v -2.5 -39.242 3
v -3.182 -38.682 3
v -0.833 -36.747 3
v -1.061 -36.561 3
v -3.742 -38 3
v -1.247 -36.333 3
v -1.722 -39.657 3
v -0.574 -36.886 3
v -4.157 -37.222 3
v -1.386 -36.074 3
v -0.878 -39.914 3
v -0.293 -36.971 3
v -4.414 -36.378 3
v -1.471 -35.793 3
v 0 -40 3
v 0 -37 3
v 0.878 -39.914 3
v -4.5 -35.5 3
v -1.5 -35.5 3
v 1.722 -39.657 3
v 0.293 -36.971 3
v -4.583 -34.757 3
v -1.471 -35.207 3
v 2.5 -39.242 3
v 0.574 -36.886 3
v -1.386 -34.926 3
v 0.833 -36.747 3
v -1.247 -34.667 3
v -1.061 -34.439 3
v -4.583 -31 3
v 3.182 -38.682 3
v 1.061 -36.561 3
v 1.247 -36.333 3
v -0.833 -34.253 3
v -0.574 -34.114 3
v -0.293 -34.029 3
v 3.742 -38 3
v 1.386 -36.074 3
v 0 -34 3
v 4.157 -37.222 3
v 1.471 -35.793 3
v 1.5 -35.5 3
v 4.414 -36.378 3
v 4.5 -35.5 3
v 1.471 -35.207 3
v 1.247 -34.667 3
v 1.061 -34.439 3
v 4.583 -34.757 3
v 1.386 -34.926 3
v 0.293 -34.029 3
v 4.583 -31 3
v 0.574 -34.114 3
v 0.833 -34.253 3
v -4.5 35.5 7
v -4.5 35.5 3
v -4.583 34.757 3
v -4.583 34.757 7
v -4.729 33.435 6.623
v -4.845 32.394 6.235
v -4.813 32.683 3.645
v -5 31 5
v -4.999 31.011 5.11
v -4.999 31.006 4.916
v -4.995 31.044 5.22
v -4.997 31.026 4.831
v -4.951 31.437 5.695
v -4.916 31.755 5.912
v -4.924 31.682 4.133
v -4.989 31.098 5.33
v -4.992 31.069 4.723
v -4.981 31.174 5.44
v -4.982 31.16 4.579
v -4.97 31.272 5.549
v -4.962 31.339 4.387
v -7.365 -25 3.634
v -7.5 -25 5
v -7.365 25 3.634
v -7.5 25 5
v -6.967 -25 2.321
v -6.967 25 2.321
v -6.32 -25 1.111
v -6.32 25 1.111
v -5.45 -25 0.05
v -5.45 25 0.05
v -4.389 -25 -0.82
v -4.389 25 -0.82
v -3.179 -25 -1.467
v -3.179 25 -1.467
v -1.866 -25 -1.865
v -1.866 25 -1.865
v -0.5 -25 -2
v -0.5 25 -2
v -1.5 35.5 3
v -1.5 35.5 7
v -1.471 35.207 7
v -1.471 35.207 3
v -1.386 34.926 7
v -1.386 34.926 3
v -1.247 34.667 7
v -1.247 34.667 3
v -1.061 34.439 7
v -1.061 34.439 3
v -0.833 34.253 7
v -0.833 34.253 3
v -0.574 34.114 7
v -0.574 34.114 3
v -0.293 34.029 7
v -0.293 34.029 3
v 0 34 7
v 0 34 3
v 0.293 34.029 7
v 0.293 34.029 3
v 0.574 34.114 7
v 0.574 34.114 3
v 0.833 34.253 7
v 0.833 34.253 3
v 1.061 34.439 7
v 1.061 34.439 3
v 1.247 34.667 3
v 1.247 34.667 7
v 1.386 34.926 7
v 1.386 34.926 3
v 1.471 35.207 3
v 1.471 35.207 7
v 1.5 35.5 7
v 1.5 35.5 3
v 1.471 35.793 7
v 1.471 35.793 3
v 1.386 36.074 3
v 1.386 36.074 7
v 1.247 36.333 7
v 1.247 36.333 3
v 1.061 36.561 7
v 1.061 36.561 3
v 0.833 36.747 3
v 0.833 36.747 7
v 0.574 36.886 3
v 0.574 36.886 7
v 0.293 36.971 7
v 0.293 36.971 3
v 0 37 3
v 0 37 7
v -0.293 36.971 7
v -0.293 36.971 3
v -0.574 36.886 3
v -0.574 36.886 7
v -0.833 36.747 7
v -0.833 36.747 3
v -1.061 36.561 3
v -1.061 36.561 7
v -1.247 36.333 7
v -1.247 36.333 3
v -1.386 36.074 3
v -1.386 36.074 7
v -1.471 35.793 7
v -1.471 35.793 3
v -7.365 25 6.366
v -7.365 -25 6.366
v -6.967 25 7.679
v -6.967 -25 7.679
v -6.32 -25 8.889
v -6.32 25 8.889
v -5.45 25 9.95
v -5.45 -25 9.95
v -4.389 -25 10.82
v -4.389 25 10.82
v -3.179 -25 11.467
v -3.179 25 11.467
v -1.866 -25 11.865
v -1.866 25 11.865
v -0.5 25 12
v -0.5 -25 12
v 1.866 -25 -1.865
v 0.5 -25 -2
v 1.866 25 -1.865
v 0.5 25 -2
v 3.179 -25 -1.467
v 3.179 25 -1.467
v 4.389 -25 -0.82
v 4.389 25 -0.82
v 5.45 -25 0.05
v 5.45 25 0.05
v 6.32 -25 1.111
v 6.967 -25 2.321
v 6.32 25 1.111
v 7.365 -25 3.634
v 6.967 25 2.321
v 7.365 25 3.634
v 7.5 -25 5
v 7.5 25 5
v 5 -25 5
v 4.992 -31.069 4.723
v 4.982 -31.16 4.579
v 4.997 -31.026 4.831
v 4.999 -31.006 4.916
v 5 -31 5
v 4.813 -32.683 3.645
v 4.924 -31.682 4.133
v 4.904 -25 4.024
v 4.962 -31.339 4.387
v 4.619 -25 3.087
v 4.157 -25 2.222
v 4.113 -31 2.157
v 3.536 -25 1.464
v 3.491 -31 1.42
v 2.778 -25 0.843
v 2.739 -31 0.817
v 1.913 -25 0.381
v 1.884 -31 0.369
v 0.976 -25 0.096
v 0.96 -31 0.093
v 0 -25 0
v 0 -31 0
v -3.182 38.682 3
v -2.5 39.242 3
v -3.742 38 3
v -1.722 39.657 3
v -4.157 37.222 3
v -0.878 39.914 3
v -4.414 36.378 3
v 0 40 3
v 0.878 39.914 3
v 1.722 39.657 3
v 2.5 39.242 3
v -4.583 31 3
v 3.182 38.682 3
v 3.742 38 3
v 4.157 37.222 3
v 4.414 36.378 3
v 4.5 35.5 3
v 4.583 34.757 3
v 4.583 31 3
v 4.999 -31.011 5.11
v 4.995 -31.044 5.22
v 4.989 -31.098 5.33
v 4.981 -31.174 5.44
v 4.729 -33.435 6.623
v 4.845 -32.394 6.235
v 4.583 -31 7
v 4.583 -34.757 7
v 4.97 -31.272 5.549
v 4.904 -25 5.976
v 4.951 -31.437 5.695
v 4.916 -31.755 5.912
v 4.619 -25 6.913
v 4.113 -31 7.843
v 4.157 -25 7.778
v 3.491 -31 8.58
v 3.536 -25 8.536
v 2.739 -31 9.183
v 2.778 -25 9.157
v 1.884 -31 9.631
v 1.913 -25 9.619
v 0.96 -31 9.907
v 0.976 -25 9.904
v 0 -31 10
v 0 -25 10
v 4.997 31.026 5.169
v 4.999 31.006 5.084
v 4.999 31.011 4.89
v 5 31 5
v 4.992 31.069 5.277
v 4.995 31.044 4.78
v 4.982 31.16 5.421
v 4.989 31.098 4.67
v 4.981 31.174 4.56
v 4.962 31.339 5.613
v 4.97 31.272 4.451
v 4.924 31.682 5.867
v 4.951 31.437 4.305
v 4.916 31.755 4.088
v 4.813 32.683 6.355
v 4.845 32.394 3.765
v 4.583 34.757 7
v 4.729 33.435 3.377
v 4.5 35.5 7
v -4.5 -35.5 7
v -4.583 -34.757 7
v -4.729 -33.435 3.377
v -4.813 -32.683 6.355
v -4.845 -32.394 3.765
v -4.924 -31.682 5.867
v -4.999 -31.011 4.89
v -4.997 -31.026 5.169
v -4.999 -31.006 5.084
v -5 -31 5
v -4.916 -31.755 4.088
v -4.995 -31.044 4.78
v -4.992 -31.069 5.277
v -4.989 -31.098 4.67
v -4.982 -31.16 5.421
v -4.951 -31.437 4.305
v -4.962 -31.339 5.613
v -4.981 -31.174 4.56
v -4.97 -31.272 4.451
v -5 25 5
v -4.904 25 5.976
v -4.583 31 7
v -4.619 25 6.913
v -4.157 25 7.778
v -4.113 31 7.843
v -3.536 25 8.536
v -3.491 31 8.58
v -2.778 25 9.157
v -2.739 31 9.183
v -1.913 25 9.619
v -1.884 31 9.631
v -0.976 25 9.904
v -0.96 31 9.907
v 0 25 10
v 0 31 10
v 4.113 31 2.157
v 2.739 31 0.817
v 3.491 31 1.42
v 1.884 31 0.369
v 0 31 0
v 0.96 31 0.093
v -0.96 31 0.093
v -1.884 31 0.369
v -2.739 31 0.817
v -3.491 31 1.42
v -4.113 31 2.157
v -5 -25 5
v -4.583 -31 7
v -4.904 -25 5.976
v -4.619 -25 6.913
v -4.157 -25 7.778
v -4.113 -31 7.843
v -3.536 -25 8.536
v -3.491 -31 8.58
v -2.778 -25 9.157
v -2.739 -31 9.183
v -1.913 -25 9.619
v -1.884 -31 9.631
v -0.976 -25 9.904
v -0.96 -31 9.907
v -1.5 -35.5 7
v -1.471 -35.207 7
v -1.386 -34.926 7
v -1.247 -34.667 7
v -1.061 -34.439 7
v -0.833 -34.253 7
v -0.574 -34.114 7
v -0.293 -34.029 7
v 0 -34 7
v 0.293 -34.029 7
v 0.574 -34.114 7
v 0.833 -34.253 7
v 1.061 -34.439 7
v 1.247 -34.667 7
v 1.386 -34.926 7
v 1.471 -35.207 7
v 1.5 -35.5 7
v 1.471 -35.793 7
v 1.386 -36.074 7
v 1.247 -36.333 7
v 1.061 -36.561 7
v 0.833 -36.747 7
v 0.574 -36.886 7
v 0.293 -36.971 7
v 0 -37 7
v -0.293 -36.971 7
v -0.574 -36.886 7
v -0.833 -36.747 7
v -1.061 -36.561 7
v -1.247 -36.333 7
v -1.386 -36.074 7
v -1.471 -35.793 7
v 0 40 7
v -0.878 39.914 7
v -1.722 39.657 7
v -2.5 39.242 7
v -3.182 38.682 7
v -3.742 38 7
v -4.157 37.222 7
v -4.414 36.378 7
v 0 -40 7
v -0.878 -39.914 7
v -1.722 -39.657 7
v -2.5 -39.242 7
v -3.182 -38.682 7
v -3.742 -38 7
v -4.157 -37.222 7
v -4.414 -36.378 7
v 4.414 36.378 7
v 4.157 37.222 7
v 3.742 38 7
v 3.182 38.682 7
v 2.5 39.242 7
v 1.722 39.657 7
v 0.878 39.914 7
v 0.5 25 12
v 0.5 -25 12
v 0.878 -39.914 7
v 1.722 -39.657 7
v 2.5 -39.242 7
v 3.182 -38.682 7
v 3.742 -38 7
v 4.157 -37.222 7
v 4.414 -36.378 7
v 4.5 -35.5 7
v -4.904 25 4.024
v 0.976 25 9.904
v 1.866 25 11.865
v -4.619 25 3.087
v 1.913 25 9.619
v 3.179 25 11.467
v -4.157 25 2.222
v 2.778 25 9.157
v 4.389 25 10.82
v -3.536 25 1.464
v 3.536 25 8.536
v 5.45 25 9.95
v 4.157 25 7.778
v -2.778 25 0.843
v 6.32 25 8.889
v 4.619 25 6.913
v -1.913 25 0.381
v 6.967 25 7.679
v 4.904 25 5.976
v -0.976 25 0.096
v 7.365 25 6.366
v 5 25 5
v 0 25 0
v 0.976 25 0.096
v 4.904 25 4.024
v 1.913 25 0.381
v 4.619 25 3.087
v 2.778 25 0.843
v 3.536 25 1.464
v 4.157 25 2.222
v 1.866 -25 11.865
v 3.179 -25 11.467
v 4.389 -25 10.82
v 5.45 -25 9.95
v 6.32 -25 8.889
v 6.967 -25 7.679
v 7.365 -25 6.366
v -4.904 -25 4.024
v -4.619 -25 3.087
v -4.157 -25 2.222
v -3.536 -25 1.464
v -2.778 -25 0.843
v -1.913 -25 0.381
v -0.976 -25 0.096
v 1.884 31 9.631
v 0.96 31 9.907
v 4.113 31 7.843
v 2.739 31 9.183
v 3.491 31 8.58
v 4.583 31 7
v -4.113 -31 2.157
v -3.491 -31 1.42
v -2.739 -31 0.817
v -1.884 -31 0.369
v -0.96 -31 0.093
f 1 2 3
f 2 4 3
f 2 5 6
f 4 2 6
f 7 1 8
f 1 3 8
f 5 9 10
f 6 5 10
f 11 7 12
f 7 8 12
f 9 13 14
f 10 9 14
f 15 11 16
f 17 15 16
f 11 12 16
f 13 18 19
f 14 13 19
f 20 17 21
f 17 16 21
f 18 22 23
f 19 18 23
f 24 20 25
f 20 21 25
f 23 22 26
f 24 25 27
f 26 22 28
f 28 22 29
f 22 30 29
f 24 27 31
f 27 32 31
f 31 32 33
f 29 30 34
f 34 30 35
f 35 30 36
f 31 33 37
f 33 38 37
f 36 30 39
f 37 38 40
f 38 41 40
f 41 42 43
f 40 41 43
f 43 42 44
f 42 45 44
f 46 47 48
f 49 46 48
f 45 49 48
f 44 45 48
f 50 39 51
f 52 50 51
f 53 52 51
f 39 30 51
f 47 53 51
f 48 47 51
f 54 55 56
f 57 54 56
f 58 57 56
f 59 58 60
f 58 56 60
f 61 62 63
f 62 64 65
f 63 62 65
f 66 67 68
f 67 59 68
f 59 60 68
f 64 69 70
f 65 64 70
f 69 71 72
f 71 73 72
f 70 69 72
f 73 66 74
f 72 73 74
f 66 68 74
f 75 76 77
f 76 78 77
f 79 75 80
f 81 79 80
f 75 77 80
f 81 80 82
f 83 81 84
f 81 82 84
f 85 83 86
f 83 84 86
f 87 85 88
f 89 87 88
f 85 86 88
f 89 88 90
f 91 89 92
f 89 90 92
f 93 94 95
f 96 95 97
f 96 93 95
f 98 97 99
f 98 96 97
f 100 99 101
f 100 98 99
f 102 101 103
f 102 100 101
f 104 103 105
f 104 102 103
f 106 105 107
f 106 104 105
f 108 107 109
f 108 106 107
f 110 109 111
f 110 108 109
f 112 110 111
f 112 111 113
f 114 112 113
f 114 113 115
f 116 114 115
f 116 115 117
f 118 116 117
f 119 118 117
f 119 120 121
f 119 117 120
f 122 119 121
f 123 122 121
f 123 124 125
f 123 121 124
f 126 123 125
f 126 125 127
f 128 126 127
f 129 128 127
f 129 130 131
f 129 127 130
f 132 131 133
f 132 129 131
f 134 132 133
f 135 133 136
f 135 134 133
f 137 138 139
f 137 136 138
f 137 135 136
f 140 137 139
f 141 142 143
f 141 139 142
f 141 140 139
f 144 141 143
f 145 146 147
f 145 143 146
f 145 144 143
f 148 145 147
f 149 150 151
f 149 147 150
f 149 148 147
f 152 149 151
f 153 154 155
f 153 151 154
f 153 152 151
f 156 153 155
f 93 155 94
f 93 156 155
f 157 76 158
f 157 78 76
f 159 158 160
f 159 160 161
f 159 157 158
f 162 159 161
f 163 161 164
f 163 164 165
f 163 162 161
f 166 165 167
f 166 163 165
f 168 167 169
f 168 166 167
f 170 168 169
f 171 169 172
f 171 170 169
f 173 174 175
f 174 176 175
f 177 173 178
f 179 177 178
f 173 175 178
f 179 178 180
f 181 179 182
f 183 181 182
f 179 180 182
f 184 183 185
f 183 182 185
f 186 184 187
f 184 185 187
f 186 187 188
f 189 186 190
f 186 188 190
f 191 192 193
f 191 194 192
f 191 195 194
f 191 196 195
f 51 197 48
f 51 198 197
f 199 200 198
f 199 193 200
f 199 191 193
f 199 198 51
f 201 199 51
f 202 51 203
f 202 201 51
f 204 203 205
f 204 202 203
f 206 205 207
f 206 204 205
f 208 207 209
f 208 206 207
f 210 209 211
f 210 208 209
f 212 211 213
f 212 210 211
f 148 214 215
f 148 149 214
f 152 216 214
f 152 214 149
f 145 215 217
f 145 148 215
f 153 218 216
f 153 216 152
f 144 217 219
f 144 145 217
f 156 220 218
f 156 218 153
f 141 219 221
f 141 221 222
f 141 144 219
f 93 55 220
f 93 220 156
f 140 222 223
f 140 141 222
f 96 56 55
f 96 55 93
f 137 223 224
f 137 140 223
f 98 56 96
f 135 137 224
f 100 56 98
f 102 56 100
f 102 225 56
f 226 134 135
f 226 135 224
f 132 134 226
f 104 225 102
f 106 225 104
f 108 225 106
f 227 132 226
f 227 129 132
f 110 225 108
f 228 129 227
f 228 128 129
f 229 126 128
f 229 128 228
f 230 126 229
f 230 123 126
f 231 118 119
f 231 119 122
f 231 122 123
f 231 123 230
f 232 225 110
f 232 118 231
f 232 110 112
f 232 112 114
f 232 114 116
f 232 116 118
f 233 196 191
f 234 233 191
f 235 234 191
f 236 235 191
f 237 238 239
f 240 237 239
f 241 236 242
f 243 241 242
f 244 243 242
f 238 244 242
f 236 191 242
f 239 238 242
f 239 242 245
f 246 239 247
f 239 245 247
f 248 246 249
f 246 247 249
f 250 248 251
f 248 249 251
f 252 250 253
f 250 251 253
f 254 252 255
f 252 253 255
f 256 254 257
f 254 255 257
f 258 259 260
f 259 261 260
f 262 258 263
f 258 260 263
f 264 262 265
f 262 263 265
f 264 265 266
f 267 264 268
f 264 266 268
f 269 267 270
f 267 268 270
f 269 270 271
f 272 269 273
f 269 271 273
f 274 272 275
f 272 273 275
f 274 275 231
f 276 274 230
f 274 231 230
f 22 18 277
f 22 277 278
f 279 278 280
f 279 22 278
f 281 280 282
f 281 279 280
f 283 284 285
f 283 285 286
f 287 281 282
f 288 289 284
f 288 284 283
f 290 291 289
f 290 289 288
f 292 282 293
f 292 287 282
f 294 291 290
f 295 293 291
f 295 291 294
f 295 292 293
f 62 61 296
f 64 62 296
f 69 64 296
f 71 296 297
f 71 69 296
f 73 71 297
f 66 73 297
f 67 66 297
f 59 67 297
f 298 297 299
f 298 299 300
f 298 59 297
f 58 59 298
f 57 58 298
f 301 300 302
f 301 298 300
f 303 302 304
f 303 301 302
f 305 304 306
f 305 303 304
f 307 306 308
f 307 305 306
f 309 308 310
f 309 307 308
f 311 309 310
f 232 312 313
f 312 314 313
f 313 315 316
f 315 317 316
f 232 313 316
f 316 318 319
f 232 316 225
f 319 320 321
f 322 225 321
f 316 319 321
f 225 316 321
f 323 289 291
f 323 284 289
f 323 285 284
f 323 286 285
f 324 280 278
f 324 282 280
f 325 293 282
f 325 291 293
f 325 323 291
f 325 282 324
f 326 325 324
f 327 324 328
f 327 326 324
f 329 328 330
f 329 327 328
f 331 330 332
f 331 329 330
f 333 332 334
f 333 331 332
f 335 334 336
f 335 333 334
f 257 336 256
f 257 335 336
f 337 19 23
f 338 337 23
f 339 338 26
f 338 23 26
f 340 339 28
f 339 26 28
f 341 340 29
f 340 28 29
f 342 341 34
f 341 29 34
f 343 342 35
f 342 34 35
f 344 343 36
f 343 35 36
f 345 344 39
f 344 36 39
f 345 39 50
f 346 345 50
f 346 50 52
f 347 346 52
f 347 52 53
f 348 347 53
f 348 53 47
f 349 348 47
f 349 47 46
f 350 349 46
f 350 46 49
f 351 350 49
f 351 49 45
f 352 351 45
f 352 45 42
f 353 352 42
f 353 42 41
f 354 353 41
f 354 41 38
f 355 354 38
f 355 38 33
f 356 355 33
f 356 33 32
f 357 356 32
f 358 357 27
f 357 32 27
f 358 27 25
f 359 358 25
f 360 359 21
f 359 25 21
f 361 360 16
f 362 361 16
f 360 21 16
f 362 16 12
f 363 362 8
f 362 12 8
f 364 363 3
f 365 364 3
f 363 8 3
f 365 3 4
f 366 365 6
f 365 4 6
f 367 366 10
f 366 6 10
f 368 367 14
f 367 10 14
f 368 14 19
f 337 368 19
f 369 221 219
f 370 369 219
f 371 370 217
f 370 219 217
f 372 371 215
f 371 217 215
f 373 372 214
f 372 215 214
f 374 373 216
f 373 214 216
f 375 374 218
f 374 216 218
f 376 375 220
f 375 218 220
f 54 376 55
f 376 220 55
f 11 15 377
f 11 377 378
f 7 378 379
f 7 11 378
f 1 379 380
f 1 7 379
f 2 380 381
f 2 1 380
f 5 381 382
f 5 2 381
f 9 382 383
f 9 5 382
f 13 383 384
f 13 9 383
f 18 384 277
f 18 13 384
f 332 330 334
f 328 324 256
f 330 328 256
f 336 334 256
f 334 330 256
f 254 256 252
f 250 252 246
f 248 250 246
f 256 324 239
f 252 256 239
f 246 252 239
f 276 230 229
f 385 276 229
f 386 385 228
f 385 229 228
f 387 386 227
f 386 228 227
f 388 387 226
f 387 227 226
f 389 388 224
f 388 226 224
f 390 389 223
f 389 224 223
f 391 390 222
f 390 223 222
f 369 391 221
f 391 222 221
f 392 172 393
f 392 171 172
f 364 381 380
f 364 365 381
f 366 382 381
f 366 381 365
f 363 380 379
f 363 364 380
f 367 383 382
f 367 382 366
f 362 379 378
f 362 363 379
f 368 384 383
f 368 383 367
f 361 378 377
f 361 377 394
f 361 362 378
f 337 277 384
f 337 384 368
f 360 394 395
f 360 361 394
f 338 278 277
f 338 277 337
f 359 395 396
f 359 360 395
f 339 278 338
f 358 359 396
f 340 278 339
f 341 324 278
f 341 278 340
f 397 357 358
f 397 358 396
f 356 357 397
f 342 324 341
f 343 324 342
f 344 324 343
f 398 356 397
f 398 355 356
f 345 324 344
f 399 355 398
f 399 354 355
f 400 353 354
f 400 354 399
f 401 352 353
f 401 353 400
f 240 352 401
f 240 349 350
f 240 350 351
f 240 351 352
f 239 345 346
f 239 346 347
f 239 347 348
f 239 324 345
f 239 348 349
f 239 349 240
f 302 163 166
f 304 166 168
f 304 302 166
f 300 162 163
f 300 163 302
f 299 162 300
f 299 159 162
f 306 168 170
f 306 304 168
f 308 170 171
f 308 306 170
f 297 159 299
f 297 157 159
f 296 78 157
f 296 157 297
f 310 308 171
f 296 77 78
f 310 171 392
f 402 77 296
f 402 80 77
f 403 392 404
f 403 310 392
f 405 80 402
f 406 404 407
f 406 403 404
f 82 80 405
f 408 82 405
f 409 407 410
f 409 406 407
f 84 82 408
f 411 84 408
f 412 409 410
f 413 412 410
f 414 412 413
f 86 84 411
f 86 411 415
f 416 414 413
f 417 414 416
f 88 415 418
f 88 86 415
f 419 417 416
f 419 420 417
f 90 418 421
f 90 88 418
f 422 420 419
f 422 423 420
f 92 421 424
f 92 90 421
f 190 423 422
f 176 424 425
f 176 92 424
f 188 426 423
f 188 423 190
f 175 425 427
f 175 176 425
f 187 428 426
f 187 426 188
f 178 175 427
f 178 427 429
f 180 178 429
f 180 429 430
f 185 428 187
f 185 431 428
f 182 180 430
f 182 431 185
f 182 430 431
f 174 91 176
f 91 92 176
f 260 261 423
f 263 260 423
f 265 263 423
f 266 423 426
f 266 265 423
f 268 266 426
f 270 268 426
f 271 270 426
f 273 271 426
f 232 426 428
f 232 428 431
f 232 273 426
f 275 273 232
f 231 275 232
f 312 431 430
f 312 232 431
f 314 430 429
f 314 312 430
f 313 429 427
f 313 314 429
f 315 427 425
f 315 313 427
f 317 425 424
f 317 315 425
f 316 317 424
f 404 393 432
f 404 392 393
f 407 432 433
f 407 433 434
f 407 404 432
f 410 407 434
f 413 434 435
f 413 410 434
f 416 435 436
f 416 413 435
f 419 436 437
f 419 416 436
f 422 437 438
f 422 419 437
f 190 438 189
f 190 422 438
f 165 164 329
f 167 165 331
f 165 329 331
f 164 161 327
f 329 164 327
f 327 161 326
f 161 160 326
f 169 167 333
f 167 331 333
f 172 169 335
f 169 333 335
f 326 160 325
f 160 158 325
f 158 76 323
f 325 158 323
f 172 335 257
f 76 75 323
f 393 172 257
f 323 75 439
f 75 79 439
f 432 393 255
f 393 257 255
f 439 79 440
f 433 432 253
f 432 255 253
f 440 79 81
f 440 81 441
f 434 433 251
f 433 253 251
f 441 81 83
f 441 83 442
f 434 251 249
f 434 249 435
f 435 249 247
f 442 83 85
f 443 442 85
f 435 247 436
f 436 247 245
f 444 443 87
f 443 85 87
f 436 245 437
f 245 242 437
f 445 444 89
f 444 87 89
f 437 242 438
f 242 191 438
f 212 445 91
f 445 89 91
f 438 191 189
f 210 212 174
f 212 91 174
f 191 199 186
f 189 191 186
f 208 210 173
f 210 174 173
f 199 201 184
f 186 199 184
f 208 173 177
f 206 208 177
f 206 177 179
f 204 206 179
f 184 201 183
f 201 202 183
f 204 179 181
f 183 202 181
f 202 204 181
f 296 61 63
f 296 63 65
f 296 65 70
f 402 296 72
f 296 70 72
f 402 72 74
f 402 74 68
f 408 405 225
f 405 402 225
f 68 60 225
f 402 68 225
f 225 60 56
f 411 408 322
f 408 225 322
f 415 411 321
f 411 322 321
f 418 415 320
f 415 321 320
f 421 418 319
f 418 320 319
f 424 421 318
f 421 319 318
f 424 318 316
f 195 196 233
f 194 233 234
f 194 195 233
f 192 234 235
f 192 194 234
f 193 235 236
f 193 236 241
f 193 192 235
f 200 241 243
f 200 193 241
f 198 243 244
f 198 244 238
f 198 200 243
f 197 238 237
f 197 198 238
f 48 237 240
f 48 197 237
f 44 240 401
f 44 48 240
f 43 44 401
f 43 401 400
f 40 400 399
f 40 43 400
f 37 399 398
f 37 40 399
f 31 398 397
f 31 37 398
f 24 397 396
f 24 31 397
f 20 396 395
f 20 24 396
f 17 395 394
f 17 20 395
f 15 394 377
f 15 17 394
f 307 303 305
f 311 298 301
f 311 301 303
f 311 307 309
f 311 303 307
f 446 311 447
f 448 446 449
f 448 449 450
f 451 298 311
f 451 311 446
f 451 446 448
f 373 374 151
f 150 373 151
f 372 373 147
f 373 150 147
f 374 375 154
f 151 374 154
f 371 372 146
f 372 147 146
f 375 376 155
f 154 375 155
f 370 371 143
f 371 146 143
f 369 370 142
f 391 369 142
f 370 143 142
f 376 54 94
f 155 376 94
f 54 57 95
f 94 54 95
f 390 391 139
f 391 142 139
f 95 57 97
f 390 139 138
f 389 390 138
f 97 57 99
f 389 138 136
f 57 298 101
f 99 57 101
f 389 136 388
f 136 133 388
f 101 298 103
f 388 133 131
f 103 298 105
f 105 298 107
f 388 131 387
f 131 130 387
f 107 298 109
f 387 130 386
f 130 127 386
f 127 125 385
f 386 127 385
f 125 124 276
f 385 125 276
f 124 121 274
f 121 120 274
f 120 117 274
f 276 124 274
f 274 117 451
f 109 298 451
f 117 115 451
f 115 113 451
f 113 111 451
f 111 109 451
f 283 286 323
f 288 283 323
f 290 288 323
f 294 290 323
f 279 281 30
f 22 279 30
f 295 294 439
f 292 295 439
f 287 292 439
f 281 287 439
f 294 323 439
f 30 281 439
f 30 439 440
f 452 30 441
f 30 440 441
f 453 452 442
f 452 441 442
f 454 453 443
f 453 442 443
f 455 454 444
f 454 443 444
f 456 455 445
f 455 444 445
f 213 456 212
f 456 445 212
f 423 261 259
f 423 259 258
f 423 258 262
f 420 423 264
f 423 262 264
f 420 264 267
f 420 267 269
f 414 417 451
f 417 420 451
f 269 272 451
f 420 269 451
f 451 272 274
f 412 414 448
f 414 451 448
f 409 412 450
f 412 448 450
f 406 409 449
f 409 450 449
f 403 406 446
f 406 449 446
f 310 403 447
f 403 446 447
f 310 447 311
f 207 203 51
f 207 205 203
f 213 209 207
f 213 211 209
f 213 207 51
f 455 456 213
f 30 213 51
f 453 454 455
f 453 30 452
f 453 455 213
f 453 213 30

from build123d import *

# Parameters (mm, degrees)
SKETCH2_W                = 10
SKETCH2_H                = 80
BOSS_EXTRUDE1_DEPTH      = 10
FILLET1_R                = 5
CUT_EXTRUDE1_DEPTH       = 3
CUT_EXTRUDE2_START       = 7
SKETCH3_2_W              = 10
SKETCH3_2_H              = 9
CUT_EXTRUDE2_DEPTH       = 3
CUT_EXTRUDE4_START       = -4
CUT_EXTRUDE4_DEPTH       = 46.533119315
SKETCH7_R                = 1.5
CUT_EXTRUDE5_DEPTH       = 41.914545091
BOSS_EXTRUDE2_DEPTH      = 7
BOSS_EXTRUDE2_DEPTH_BACK = 7
SKETCH9_W                = 15
SKETCH9_H                = 50
FILLET3_R                = 7


with BuildPart() as part:
    # Sketch2 → Boss-Extrude1 (new body)
    with BuildSketch(Plane.XY):
        Rectangle(SKETCH2_W, SKETCH2_H)
    extrude(amount=BOSS_EXTRUDE1_DEPTH)

    # Fillet1
    fillet1_edges = [part.edges().sort_by_distance(p)[0] for p in [
        (-5, 0, 0),
        (5, 0, 0),
        (5, 0, 10),
        (-5, 0, 10),
    ]]
    fillet(fillet1_edges, radius=FILLET1_R - 0.0001)  # a hair under: the kernel refuses the full size

    # Sketch3 → Cut-Extrude1 (cut)
    with BuildSketch(Plane.XY):
        with BuildLine():
            Line((-5, -31), (-4.5, -35.5))
            ThreePointArc((-4.5, -35.5), (0, -40), (4.5, -35.5))
            Line((4.5, -35.5), (5, -31))
            Line((5, -31), (-5, -31))
        make_face()
        with BuildLine():
            Line((0, -40), (5, -40))
            Line((5, -40), (5, -31))
            Line((5, -31), (4.5, -35.5))
            ThreePointArc((4.5, -35.5), (3.181980515, -38.681980515), (0, -40))
        make_face()
        with BuildLine():
            Line((-5, -40), (0, -40))
            ThreePointArc((0, -40), (-3.181980515, -38.681980515), (-4.5, -35.5))
            Line((-4.5, -35.5), (-5, -31))
            Line((-5, -31), (-5, -40))
        make_face()
    cut_extrude1 = extrude(amount=CUT_EXTRUDE1_DEPTH, mode=Mode.SUBTRACT)

    # Sketch3<2> → Cut-Extrude2 (cut)
    with BuildSketch(Plane.XY.offset(CUT_EXTRUDE2_START)):
        with Locations((0, -35.5)):
            Rectangle(SKETCH3_2_W, SKETCH3_2_H)
    cut_extrude2 = extrude(amount=CUT_EXTRUDE2_DEPTH, mode=Mode.SUBTRACT)

    # Mirror1: Cut-Extrude1, Cut-Extrude2 across plane
    add(cut_extrude1.mirror(Plane.ZX), mode=Mode.SUBTRACT)
    add(cut_extrude2.mirror(Plane.ZX), mode=Mode.SUBTRACT)

    # Sketch3<4> → Cut-Extrude4 (cut)
    with BuildSketch(Plane.XY.offset(CUT_EXTRUDE4_START)):
        with BuildLine():
            Line((0, -40), (5, -40))
            Line((5, -40), (5, -31))
            Line((5, -31), (4.5, -35.5))
            ThreePointArc((4.5, -35.5), (3.181980515, -38.681980515), (0, -40))
        make_face()
        with BuildLine():
            Line((-5, -40), (0, -40))
            ThreePointArc((0, -40), (-3.181980515, -38.681980515), (-4.5, -35.5))
            Line((-4.5, -35.5), (-5, -31))
            Line((-5, -31), (-5, -40))
        make_face()
    cut_extrude4 = extrude(amount=CUT_EXTRUDE4_DEPTH, mode=Mode.SUBTRACT)

    # Sketch7 → Cut-Extrude5 (cut, through all)
    with BuildSketch(Plane(origin=(0, 0, 3), x_dir=(-1, 0, 0), z_dir=(0, 0, -1))):
        with Locations((0, -35.5)):
            Circle(SKETCH7_R)
    cut_extrude5 = extrude(amount=-CUT_EXTRUDE5_DEPTH, mode=Mode.SUBTRACT)

    # Mirror3: Cut-Extrude5 across plane
    add(cut_extrude5.mirror(Plane.ZX), mode=Mode.SUBTRACT)

    # Mirror4: Cut-Extrude4 across plane
    add(cut_extrude4.mirror(Plane.ZX), mode=Mode.SUBTRACT)

    # Sketch9 → Boss-Extrude2 (add, two sides: drawn at the far end of the back side and taken through both)
    with BuildSketch(Plane.XY.offset(5).offset(-BOSS_EXTRUDE2_DEPTH_BACK)):
        Rectangle(SKETCH9_W, SKETCH9_H)
    extrude(amount=BOSS_EXTRUDE2_DEPTH + BOSS_EXTRUDE2_DEPTH_BACK)

    # Fillet3
    fillet3_edges = [part.edges().sort_by_distance(p)[0] for p in [
        (-7.5, 0, 12),
        (7.5, 0, 12),
        (7.5, 0, -2),
        (-7.5, 0, -2),
    ]]
    fillet(fillet3_edges, radius=FILLET3_R - 0.0001)  # a hair under: the kernel refuses the full size


solid = part.part
